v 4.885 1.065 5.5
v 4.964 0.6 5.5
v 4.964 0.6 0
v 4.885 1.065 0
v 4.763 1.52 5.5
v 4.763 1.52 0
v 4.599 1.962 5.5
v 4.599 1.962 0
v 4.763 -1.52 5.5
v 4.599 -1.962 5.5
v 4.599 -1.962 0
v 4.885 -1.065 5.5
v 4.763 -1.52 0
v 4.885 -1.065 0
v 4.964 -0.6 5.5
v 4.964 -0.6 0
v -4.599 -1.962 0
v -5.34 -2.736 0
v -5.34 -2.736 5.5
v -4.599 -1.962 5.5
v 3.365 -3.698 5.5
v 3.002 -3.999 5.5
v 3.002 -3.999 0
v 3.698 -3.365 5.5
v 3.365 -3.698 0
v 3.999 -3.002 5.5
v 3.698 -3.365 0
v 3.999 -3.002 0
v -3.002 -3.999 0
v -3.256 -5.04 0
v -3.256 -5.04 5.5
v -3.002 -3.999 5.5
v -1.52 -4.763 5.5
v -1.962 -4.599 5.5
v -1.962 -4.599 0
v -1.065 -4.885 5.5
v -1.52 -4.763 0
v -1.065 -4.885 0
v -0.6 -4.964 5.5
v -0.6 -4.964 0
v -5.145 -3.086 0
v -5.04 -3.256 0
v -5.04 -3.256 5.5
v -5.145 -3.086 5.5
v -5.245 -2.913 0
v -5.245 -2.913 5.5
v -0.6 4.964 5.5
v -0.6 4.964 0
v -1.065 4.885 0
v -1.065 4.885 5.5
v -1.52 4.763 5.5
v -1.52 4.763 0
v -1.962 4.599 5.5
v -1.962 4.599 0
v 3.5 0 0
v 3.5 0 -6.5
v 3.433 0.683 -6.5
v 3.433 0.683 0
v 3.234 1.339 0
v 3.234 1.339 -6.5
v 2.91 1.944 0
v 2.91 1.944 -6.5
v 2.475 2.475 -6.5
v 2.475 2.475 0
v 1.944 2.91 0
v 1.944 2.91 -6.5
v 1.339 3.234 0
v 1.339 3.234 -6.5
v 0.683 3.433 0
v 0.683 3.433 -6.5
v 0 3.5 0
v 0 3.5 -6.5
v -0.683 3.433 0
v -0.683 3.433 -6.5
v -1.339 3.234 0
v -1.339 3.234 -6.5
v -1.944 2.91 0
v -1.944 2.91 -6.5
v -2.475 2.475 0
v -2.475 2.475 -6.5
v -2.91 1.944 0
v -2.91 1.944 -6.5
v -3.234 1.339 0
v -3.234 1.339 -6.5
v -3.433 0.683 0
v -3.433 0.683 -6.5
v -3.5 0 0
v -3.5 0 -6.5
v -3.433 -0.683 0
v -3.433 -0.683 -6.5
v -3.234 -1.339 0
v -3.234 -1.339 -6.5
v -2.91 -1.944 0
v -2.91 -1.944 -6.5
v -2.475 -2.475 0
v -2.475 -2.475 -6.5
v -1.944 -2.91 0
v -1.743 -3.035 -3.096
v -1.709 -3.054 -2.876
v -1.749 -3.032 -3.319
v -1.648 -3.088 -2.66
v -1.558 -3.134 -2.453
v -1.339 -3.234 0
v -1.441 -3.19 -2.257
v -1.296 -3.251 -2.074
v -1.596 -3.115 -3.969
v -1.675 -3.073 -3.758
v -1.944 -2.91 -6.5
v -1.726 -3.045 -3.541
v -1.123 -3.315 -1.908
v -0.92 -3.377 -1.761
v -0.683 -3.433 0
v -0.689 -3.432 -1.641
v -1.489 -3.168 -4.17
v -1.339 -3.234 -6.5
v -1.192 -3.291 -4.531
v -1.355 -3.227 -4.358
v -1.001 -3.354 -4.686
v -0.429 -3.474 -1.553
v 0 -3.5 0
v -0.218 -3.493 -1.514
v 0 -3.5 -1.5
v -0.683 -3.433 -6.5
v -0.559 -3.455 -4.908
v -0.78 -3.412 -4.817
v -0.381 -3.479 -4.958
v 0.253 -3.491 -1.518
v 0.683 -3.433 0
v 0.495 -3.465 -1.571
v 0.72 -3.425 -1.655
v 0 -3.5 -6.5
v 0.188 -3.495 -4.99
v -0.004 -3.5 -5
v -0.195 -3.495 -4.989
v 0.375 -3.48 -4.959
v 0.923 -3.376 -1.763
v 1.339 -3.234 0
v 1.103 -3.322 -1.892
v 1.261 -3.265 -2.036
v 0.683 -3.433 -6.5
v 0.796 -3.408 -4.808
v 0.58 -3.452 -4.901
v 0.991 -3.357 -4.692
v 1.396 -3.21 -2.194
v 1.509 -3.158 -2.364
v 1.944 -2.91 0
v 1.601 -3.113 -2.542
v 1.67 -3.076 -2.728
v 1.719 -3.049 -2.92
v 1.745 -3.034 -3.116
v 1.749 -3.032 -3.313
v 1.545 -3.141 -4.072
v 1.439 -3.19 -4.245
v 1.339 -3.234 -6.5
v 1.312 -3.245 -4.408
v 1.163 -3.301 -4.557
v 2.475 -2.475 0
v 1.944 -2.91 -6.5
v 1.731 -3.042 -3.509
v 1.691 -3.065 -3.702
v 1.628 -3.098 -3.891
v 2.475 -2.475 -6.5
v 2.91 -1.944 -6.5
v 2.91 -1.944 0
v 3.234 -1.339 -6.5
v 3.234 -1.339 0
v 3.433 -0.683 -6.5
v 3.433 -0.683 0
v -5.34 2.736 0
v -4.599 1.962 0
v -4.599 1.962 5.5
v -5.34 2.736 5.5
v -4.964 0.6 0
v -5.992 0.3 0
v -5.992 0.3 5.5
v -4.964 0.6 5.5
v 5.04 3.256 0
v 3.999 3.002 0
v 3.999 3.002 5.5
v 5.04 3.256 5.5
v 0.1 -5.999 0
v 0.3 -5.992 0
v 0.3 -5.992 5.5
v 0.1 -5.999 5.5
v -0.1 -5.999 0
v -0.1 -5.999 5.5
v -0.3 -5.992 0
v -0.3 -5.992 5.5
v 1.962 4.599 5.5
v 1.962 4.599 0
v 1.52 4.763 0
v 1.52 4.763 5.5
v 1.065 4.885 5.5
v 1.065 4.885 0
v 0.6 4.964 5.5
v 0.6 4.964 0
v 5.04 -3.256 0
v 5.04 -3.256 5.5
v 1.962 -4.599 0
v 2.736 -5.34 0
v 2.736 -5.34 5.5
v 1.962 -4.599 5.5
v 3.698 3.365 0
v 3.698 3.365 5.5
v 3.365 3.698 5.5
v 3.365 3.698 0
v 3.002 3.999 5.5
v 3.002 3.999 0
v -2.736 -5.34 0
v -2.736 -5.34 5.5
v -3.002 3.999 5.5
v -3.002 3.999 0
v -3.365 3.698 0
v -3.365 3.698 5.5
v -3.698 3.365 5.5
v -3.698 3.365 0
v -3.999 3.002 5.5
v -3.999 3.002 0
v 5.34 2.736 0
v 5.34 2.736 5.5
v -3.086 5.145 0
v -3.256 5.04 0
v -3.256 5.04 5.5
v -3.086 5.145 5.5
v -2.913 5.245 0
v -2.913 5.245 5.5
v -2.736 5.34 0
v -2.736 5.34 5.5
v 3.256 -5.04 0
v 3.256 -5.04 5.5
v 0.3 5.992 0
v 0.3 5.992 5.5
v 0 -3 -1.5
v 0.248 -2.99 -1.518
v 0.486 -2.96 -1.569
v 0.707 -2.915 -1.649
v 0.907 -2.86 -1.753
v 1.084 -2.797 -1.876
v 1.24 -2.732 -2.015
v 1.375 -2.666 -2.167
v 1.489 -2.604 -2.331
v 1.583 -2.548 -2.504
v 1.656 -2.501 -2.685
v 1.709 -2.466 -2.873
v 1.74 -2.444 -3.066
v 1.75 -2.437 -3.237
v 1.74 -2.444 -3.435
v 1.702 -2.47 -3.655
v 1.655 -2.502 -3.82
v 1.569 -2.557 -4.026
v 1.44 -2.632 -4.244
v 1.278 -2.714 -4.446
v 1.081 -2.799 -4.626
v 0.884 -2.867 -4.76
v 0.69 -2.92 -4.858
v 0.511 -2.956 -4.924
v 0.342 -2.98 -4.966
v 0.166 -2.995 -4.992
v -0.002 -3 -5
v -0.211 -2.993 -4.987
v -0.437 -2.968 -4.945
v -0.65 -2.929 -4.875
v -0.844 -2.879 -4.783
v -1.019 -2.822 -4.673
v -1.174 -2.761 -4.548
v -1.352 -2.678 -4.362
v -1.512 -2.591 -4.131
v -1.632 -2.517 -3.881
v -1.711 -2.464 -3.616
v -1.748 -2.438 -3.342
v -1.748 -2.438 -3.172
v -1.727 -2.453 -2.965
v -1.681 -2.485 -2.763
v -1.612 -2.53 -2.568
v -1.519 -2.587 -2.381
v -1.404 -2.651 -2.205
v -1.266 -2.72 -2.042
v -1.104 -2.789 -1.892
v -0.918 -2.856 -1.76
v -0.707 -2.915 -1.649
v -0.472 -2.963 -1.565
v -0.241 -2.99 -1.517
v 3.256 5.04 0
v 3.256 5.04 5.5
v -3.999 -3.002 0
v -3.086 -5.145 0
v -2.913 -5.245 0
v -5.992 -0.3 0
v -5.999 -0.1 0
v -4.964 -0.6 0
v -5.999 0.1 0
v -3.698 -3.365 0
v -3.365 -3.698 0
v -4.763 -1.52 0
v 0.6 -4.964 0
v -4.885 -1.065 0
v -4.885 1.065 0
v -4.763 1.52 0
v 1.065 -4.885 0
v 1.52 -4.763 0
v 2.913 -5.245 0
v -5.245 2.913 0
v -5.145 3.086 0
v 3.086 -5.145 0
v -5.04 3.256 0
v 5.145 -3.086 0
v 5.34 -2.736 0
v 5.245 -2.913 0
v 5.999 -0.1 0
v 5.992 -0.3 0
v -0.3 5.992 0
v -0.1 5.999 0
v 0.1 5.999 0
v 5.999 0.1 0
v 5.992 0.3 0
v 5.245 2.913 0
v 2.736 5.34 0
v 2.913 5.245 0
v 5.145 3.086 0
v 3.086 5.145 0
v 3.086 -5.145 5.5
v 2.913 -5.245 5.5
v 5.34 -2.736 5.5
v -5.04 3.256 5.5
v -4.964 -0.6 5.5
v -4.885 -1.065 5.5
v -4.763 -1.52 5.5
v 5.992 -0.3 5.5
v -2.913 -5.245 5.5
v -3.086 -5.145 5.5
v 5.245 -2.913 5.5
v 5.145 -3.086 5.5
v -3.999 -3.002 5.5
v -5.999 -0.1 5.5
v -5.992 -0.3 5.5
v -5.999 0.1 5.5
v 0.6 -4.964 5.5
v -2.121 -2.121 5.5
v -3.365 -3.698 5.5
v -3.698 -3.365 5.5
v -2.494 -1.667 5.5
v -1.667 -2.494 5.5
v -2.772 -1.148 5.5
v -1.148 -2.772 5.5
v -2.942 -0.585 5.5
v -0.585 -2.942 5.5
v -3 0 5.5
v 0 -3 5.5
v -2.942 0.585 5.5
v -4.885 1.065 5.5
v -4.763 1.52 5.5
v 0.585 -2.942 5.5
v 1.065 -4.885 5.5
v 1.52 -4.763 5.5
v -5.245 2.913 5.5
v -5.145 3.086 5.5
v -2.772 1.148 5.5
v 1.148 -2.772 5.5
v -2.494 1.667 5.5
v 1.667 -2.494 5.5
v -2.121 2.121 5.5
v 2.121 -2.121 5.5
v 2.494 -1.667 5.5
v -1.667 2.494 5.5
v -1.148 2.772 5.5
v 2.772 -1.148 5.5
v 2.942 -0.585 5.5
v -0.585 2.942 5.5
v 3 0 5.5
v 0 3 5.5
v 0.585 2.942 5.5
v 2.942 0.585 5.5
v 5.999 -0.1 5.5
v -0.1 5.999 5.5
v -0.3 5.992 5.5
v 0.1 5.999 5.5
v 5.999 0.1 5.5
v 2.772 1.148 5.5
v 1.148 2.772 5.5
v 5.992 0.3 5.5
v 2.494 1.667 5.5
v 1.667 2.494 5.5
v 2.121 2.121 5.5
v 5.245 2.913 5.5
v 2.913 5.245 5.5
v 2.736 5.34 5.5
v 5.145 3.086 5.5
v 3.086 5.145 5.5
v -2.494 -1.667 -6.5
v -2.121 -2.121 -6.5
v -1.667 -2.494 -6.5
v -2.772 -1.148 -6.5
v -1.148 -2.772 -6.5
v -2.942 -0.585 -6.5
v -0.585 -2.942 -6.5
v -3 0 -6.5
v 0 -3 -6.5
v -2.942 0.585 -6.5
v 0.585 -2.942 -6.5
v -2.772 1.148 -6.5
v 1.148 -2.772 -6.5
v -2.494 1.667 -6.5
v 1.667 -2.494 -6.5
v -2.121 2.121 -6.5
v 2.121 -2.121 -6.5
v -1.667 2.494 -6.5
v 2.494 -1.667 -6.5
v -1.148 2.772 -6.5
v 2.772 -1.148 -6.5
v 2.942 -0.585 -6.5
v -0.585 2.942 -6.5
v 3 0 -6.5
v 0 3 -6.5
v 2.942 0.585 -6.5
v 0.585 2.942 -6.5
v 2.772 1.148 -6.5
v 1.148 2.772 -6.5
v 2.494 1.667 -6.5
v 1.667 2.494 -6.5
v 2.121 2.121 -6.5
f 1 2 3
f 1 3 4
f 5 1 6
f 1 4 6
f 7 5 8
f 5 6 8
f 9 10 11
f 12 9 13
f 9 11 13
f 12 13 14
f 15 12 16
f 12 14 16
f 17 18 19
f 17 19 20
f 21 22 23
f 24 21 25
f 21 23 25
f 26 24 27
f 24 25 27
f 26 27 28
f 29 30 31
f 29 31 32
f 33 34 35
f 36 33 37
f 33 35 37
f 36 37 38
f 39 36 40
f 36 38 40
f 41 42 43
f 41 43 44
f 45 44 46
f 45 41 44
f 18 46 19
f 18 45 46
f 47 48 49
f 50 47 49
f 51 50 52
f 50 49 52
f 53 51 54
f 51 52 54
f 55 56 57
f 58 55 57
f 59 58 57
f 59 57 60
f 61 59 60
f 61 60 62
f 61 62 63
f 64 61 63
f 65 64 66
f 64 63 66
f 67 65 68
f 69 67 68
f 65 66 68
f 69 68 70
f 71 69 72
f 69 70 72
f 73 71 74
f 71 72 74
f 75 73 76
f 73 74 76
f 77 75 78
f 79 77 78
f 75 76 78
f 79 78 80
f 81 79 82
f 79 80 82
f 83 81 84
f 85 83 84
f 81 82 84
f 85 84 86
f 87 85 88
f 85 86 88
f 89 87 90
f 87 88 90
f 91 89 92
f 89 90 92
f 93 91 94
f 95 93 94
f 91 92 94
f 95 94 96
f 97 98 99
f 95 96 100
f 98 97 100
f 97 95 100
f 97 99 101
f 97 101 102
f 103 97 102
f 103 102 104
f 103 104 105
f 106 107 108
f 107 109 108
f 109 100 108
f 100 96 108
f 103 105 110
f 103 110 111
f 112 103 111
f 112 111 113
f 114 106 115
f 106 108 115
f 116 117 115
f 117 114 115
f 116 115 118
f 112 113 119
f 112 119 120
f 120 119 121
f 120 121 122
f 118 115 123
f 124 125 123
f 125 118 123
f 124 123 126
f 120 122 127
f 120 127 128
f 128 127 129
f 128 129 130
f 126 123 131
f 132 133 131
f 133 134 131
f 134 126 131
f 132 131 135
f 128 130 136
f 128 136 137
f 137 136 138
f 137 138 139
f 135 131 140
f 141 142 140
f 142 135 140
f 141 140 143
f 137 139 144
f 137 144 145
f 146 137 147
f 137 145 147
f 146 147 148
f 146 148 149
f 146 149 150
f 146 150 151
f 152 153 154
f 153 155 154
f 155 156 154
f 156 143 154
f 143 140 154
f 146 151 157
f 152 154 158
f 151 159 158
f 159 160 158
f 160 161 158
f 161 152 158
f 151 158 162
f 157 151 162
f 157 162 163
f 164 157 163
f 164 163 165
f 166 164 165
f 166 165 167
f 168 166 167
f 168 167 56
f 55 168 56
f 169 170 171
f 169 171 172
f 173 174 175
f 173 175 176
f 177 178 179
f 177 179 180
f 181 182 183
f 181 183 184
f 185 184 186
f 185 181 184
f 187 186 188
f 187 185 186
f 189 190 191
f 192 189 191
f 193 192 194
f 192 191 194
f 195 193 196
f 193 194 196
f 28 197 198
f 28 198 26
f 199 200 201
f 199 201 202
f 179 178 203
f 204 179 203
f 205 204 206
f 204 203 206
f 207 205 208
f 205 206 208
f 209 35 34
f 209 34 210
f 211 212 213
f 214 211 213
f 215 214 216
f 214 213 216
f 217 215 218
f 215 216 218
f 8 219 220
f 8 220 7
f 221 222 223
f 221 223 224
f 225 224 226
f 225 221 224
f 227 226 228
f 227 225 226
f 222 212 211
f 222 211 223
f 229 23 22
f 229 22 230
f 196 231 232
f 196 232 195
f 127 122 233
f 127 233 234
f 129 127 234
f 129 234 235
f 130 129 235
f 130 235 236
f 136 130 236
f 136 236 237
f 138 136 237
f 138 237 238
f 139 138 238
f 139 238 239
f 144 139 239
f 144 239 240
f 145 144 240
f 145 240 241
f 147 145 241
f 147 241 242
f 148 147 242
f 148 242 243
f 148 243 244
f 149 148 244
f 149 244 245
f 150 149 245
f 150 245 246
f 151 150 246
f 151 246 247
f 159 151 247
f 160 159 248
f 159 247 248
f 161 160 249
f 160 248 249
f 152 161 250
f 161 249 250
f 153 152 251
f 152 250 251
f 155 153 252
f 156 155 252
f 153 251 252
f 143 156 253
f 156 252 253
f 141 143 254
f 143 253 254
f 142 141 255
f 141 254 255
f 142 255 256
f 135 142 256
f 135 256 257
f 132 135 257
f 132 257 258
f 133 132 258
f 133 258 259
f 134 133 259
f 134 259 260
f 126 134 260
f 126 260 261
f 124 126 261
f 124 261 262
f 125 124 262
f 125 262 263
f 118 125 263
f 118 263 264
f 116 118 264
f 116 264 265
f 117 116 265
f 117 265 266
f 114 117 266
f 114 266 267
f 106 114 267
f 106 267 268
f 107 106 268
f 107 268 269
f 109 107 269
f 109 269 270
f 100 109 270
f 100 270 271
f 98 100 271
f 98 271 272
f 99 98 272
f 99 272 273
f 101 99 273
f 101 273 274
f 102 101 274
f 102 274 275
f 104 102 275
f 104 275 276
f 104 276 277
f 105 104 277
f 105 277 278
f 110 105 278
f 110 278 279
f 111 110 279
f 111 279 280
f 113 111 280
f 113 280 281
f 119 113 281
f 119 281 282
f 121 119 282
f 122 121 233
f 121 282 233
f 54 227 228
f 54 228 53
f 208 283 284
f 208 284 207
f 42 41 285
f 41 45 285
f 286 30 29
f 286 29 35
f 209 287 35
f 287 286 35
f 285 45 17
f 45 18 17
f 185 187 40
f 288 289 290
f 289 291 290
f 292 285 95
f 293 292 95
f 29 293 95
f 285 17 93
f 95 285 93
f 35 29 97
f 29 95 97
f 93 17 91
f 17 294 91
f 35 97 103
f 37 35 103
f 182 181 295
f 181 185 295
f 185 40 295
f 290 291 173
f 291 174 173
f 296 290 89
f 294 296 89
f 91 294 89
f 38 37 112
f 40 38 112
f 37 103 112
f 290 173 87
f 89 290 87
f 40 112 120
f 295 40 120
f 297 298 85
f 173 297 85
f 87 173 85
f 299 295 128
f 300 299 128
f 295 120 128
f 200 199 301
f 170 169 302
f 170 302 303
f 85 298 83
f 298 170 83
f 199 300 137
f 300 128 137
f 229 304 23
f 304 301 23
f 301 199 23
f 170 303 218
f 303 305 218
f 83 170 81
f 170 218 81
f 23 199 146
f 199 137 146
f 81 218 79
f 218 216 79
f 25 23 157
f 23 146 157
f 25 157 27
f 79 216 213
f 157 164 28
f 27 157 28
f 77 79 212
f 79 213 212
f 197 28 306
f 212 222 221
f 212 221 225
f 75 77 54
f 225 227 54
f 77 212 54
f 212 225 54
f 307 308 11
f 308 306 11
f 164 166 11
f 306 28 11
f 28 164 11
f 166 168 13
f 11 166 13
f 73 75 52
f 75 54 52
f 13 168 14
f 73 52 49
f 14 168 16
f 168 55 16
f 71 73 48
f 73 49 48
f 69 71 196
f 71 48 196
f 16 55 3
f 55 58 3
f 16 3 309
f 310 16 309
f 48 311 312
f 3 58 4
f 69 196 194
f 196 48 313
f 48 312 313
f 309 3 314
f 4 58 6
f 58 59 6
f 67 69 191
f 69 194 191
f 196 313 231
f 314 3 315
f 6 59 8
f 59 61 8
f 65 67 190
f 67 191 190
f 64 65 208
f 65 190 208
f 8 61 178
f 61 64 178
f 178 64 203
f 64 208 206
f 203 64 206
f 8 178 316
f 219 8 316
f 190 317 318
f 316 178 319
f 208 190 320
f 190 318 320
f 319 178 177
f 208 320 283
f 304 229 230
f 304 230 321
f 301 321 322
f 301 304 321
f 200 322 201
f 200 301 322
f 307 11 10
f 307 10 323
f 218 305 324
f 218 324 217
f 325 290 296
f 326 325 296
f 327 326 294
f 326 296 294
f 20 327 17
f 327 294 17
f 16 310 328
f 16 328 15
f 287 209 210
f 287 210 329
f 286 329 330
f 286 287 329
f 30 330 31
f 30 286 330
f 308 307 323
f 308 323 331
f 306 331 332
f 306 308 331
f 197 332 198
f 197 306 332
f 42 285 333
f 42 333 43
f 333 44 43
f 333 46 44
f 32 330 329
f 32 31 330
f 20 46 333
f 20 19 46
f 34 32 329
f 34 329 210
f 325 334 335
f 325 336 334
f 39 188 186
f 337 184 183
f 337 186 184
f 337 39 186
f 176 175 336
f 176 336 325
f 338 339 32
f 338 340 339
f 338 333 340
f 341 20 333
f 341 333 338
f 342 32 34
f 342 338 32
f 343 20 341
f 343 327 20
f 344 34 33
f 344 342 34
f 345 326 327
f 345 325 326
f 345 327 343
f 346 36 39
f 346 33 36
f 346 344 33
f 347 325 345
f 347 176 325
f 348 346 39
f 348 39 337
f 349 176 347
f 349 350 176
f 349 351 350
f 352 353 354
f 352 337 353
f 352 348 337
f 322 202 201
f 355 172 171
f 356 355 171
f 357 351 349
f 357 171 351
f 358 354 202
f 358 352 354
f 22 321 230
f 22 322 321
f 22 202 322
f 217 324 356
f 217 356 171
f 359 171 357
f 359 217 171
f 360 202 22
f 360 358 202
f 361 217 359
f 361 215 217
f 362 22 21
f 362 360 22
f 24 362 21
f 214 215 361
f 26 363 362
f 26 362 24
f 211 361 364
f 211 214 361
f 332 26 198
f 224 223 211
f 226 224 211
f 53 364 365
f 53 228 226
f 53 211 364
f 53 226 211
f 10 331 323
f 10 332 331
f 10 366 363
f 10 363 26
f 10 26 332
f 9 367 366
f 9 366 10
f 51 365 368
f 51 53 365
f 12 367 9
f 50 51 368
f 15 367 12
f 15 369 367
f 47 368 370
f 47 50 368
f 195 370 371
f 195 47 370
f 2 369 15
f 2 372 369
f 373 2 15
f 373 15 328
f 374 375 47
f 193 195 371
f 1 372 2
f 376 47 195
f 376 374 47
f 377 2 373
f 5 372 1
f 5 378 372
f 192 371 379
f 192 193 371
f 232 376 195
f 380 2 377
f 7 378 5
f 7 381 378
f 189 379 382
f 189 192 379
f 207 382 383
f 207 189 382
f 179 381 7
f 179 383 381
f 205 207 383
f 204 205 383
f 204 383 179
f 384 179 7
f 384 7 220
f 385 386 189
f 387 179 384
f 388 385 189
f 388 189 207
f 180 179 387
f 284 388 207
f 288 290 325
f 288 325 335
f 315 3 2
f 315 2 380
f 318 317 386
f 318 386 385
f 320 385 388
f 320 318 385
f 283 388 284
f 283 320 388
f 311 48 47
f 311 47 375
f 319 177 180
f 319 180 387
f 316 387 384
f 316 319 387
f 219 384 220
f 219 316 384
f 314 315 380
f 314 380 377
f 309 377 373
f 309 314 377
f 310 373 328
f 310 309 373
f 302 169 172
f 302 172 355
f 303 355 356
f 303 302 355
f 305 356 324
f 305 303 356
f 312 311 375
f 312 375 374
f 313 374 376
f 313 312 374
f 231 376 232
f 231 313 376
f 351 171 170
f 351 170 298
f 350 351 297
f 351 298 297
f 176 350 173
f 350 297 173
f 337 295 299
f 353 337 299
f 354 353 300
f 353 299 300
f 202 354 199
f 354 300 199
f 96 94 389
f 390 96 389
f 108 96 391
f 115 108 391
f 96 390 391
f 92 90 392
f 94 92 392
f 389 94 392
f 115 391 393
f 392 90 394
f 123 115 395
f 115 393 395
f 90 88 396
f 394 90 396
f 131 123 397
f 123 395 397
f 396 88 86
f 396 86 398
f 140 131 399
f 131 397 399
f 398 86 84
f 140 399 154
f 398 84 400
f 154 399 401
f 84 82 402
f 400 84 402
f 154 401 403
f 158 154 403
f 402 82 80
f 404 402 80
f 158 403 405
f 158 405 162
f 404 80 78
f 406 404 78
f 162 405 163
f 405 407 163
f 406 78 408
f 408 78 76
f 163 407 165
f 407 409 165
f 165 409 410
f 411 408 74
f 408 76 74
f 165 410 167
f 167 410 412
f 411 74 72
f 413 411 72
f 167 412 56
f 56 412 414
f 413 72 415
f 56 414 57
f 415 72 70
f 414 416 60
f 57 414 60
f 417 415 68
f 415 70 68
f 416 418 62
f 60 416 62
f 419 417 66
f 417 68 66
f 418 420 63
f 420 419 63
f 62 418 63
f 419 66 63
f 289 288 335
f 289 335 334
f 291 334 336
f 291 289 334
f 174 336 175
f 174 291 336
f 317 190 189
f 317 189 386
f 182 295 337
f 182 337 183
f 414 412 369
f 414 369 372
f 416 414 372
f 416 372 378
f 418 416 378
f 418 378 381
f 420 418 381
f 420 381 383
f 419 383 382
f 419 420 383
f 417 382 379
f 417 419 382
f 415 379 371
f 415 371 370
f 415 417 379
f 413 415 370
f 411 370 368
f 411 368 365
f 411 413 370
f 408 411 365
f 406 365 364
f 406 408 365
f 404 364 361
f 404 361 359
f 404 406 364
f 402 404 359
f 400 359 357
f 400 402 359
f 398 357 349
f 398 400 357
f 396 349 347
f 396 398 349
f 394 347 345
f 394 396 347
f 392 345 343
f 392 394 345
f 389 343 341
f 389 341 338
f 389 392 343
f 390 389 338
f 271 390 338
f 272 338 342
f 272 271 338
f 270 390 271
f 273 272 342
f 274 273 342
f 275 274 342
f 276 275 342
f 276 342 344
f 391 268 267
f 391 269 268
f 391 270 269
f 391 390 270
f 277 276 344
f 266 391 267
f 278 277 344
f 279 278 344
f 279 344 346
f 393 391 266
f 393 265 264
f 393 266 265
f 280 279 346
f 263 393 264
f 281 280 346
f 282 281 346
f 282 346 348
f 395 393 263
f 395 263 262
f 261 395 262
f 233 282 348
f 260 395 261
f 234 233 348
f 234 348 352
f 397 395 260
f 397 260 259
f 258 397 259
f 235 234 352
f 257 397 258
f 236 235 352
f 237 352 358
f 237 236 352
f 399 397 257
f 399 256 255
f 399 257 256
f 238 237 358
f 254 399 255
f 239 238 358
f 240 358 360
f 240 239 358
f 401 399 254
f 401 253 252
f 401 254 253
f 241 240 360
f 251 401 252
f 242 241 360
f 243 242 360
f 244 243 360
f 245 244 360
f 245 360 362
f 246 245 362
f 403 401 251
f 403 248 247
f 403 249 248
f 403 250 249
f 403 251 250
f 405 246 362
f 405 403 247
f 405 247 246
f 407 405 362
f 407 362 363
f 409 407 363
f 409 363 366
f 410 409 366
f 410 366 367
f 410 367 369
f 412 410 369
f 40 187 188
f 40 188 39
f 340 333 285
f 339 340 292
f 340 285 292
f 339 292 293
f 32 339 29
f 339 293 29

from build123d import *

# Parameters (mm, degrees)
SKETCH1_R           = 5
SKETCH1_R_2         = 3
BOSS_EXTRUDE1_DEPTH = 5.5
BOSS_EXTRUDE2_START = -5.5
BOSS_EXTRUDE2_DEPTH = 5.5
CIRPATTERN1_COUNT   = 12
BOSS_EXTRUDE3_START = -6.5
SKETCH4_R           = 3.5
SKETCH4_R_2         = 3
BOSS_EXTRUDE3_DEPTH = 6.5
SKETCH5_R           = 1.75
CUT_EXTRUDE1_DEPTH  = 6.5


with BuildPart() as part:
    # Sketch1 → Boss-Extrude1 (new body)
    with BuildSketch(Plane.XY):
        Circle(SKETCH1_R)
        Circle(SKETCH1_R_2, mode=Mode.SUBTRACT)
    extrude(amount=BOSS_EXTRUDE1_DEPTH)

    # Sketch3 → Boss-Extrude2 (add)
    with BuildSketch(Plane.XY.offset(5.5).offset(BOSS_EXTRUDE2_START)):
        with BuildLine():
            Line((-0.3, -5.992495307), (-0.6, -4.963869458))
            ThreePointArc((-0.6, -4.963869458), (0, -5), (0.6, -4.963869458))
            Line((0.6, -4.963869458), (0.3, -5.992495307))
            ThreePointArc((0.3, -5.992495307), (0, -6), (-0.3, -5.992495307))
        make_face()
    boss_extrude2 = extrude(amount=BOSS_EXTRUDE2_DEPTH)

    # CirPattern1: Boss-Extrude2 ×12 about axis
    cirpattern1_axis = Axis((0, 0, 0), (0, 0, 1))
    for i in range(1, CIRPATTERN1_COUNT):
        add(boss_extrude2.rotate(cirpattern1_axis, i * 360 / CIRPATTERN1_COUNT))

    # Sketch4 → Boss-Extrude3 (add)
    with BuildSketch(Plane.XY.offset(BOSS_EXTRUDE3_START)):
        Circle(SKETCH4_R)
        Circle(SKETCH4_R_2, mode=Mode.SUBTRACT)
    extrude(amount=BOSS_EXTRUDE3_DEPTH)

    # Sketch5 → Cut-Extrude1 (cut)
    with BuildSketch(Plane(origin=(0, 0, 0), x_dir=(1, 0, 0), z_dir=(0, 1, 0))):
        with Locations(Location((0, 3.25, 0), (0, 0, 270))):
            Circle(SKETCH5_R)
    extrude(amount=-CUT_EXTRUDE1_DEPTH, mode=Mode.SUBTRACT)


solid = part.part
